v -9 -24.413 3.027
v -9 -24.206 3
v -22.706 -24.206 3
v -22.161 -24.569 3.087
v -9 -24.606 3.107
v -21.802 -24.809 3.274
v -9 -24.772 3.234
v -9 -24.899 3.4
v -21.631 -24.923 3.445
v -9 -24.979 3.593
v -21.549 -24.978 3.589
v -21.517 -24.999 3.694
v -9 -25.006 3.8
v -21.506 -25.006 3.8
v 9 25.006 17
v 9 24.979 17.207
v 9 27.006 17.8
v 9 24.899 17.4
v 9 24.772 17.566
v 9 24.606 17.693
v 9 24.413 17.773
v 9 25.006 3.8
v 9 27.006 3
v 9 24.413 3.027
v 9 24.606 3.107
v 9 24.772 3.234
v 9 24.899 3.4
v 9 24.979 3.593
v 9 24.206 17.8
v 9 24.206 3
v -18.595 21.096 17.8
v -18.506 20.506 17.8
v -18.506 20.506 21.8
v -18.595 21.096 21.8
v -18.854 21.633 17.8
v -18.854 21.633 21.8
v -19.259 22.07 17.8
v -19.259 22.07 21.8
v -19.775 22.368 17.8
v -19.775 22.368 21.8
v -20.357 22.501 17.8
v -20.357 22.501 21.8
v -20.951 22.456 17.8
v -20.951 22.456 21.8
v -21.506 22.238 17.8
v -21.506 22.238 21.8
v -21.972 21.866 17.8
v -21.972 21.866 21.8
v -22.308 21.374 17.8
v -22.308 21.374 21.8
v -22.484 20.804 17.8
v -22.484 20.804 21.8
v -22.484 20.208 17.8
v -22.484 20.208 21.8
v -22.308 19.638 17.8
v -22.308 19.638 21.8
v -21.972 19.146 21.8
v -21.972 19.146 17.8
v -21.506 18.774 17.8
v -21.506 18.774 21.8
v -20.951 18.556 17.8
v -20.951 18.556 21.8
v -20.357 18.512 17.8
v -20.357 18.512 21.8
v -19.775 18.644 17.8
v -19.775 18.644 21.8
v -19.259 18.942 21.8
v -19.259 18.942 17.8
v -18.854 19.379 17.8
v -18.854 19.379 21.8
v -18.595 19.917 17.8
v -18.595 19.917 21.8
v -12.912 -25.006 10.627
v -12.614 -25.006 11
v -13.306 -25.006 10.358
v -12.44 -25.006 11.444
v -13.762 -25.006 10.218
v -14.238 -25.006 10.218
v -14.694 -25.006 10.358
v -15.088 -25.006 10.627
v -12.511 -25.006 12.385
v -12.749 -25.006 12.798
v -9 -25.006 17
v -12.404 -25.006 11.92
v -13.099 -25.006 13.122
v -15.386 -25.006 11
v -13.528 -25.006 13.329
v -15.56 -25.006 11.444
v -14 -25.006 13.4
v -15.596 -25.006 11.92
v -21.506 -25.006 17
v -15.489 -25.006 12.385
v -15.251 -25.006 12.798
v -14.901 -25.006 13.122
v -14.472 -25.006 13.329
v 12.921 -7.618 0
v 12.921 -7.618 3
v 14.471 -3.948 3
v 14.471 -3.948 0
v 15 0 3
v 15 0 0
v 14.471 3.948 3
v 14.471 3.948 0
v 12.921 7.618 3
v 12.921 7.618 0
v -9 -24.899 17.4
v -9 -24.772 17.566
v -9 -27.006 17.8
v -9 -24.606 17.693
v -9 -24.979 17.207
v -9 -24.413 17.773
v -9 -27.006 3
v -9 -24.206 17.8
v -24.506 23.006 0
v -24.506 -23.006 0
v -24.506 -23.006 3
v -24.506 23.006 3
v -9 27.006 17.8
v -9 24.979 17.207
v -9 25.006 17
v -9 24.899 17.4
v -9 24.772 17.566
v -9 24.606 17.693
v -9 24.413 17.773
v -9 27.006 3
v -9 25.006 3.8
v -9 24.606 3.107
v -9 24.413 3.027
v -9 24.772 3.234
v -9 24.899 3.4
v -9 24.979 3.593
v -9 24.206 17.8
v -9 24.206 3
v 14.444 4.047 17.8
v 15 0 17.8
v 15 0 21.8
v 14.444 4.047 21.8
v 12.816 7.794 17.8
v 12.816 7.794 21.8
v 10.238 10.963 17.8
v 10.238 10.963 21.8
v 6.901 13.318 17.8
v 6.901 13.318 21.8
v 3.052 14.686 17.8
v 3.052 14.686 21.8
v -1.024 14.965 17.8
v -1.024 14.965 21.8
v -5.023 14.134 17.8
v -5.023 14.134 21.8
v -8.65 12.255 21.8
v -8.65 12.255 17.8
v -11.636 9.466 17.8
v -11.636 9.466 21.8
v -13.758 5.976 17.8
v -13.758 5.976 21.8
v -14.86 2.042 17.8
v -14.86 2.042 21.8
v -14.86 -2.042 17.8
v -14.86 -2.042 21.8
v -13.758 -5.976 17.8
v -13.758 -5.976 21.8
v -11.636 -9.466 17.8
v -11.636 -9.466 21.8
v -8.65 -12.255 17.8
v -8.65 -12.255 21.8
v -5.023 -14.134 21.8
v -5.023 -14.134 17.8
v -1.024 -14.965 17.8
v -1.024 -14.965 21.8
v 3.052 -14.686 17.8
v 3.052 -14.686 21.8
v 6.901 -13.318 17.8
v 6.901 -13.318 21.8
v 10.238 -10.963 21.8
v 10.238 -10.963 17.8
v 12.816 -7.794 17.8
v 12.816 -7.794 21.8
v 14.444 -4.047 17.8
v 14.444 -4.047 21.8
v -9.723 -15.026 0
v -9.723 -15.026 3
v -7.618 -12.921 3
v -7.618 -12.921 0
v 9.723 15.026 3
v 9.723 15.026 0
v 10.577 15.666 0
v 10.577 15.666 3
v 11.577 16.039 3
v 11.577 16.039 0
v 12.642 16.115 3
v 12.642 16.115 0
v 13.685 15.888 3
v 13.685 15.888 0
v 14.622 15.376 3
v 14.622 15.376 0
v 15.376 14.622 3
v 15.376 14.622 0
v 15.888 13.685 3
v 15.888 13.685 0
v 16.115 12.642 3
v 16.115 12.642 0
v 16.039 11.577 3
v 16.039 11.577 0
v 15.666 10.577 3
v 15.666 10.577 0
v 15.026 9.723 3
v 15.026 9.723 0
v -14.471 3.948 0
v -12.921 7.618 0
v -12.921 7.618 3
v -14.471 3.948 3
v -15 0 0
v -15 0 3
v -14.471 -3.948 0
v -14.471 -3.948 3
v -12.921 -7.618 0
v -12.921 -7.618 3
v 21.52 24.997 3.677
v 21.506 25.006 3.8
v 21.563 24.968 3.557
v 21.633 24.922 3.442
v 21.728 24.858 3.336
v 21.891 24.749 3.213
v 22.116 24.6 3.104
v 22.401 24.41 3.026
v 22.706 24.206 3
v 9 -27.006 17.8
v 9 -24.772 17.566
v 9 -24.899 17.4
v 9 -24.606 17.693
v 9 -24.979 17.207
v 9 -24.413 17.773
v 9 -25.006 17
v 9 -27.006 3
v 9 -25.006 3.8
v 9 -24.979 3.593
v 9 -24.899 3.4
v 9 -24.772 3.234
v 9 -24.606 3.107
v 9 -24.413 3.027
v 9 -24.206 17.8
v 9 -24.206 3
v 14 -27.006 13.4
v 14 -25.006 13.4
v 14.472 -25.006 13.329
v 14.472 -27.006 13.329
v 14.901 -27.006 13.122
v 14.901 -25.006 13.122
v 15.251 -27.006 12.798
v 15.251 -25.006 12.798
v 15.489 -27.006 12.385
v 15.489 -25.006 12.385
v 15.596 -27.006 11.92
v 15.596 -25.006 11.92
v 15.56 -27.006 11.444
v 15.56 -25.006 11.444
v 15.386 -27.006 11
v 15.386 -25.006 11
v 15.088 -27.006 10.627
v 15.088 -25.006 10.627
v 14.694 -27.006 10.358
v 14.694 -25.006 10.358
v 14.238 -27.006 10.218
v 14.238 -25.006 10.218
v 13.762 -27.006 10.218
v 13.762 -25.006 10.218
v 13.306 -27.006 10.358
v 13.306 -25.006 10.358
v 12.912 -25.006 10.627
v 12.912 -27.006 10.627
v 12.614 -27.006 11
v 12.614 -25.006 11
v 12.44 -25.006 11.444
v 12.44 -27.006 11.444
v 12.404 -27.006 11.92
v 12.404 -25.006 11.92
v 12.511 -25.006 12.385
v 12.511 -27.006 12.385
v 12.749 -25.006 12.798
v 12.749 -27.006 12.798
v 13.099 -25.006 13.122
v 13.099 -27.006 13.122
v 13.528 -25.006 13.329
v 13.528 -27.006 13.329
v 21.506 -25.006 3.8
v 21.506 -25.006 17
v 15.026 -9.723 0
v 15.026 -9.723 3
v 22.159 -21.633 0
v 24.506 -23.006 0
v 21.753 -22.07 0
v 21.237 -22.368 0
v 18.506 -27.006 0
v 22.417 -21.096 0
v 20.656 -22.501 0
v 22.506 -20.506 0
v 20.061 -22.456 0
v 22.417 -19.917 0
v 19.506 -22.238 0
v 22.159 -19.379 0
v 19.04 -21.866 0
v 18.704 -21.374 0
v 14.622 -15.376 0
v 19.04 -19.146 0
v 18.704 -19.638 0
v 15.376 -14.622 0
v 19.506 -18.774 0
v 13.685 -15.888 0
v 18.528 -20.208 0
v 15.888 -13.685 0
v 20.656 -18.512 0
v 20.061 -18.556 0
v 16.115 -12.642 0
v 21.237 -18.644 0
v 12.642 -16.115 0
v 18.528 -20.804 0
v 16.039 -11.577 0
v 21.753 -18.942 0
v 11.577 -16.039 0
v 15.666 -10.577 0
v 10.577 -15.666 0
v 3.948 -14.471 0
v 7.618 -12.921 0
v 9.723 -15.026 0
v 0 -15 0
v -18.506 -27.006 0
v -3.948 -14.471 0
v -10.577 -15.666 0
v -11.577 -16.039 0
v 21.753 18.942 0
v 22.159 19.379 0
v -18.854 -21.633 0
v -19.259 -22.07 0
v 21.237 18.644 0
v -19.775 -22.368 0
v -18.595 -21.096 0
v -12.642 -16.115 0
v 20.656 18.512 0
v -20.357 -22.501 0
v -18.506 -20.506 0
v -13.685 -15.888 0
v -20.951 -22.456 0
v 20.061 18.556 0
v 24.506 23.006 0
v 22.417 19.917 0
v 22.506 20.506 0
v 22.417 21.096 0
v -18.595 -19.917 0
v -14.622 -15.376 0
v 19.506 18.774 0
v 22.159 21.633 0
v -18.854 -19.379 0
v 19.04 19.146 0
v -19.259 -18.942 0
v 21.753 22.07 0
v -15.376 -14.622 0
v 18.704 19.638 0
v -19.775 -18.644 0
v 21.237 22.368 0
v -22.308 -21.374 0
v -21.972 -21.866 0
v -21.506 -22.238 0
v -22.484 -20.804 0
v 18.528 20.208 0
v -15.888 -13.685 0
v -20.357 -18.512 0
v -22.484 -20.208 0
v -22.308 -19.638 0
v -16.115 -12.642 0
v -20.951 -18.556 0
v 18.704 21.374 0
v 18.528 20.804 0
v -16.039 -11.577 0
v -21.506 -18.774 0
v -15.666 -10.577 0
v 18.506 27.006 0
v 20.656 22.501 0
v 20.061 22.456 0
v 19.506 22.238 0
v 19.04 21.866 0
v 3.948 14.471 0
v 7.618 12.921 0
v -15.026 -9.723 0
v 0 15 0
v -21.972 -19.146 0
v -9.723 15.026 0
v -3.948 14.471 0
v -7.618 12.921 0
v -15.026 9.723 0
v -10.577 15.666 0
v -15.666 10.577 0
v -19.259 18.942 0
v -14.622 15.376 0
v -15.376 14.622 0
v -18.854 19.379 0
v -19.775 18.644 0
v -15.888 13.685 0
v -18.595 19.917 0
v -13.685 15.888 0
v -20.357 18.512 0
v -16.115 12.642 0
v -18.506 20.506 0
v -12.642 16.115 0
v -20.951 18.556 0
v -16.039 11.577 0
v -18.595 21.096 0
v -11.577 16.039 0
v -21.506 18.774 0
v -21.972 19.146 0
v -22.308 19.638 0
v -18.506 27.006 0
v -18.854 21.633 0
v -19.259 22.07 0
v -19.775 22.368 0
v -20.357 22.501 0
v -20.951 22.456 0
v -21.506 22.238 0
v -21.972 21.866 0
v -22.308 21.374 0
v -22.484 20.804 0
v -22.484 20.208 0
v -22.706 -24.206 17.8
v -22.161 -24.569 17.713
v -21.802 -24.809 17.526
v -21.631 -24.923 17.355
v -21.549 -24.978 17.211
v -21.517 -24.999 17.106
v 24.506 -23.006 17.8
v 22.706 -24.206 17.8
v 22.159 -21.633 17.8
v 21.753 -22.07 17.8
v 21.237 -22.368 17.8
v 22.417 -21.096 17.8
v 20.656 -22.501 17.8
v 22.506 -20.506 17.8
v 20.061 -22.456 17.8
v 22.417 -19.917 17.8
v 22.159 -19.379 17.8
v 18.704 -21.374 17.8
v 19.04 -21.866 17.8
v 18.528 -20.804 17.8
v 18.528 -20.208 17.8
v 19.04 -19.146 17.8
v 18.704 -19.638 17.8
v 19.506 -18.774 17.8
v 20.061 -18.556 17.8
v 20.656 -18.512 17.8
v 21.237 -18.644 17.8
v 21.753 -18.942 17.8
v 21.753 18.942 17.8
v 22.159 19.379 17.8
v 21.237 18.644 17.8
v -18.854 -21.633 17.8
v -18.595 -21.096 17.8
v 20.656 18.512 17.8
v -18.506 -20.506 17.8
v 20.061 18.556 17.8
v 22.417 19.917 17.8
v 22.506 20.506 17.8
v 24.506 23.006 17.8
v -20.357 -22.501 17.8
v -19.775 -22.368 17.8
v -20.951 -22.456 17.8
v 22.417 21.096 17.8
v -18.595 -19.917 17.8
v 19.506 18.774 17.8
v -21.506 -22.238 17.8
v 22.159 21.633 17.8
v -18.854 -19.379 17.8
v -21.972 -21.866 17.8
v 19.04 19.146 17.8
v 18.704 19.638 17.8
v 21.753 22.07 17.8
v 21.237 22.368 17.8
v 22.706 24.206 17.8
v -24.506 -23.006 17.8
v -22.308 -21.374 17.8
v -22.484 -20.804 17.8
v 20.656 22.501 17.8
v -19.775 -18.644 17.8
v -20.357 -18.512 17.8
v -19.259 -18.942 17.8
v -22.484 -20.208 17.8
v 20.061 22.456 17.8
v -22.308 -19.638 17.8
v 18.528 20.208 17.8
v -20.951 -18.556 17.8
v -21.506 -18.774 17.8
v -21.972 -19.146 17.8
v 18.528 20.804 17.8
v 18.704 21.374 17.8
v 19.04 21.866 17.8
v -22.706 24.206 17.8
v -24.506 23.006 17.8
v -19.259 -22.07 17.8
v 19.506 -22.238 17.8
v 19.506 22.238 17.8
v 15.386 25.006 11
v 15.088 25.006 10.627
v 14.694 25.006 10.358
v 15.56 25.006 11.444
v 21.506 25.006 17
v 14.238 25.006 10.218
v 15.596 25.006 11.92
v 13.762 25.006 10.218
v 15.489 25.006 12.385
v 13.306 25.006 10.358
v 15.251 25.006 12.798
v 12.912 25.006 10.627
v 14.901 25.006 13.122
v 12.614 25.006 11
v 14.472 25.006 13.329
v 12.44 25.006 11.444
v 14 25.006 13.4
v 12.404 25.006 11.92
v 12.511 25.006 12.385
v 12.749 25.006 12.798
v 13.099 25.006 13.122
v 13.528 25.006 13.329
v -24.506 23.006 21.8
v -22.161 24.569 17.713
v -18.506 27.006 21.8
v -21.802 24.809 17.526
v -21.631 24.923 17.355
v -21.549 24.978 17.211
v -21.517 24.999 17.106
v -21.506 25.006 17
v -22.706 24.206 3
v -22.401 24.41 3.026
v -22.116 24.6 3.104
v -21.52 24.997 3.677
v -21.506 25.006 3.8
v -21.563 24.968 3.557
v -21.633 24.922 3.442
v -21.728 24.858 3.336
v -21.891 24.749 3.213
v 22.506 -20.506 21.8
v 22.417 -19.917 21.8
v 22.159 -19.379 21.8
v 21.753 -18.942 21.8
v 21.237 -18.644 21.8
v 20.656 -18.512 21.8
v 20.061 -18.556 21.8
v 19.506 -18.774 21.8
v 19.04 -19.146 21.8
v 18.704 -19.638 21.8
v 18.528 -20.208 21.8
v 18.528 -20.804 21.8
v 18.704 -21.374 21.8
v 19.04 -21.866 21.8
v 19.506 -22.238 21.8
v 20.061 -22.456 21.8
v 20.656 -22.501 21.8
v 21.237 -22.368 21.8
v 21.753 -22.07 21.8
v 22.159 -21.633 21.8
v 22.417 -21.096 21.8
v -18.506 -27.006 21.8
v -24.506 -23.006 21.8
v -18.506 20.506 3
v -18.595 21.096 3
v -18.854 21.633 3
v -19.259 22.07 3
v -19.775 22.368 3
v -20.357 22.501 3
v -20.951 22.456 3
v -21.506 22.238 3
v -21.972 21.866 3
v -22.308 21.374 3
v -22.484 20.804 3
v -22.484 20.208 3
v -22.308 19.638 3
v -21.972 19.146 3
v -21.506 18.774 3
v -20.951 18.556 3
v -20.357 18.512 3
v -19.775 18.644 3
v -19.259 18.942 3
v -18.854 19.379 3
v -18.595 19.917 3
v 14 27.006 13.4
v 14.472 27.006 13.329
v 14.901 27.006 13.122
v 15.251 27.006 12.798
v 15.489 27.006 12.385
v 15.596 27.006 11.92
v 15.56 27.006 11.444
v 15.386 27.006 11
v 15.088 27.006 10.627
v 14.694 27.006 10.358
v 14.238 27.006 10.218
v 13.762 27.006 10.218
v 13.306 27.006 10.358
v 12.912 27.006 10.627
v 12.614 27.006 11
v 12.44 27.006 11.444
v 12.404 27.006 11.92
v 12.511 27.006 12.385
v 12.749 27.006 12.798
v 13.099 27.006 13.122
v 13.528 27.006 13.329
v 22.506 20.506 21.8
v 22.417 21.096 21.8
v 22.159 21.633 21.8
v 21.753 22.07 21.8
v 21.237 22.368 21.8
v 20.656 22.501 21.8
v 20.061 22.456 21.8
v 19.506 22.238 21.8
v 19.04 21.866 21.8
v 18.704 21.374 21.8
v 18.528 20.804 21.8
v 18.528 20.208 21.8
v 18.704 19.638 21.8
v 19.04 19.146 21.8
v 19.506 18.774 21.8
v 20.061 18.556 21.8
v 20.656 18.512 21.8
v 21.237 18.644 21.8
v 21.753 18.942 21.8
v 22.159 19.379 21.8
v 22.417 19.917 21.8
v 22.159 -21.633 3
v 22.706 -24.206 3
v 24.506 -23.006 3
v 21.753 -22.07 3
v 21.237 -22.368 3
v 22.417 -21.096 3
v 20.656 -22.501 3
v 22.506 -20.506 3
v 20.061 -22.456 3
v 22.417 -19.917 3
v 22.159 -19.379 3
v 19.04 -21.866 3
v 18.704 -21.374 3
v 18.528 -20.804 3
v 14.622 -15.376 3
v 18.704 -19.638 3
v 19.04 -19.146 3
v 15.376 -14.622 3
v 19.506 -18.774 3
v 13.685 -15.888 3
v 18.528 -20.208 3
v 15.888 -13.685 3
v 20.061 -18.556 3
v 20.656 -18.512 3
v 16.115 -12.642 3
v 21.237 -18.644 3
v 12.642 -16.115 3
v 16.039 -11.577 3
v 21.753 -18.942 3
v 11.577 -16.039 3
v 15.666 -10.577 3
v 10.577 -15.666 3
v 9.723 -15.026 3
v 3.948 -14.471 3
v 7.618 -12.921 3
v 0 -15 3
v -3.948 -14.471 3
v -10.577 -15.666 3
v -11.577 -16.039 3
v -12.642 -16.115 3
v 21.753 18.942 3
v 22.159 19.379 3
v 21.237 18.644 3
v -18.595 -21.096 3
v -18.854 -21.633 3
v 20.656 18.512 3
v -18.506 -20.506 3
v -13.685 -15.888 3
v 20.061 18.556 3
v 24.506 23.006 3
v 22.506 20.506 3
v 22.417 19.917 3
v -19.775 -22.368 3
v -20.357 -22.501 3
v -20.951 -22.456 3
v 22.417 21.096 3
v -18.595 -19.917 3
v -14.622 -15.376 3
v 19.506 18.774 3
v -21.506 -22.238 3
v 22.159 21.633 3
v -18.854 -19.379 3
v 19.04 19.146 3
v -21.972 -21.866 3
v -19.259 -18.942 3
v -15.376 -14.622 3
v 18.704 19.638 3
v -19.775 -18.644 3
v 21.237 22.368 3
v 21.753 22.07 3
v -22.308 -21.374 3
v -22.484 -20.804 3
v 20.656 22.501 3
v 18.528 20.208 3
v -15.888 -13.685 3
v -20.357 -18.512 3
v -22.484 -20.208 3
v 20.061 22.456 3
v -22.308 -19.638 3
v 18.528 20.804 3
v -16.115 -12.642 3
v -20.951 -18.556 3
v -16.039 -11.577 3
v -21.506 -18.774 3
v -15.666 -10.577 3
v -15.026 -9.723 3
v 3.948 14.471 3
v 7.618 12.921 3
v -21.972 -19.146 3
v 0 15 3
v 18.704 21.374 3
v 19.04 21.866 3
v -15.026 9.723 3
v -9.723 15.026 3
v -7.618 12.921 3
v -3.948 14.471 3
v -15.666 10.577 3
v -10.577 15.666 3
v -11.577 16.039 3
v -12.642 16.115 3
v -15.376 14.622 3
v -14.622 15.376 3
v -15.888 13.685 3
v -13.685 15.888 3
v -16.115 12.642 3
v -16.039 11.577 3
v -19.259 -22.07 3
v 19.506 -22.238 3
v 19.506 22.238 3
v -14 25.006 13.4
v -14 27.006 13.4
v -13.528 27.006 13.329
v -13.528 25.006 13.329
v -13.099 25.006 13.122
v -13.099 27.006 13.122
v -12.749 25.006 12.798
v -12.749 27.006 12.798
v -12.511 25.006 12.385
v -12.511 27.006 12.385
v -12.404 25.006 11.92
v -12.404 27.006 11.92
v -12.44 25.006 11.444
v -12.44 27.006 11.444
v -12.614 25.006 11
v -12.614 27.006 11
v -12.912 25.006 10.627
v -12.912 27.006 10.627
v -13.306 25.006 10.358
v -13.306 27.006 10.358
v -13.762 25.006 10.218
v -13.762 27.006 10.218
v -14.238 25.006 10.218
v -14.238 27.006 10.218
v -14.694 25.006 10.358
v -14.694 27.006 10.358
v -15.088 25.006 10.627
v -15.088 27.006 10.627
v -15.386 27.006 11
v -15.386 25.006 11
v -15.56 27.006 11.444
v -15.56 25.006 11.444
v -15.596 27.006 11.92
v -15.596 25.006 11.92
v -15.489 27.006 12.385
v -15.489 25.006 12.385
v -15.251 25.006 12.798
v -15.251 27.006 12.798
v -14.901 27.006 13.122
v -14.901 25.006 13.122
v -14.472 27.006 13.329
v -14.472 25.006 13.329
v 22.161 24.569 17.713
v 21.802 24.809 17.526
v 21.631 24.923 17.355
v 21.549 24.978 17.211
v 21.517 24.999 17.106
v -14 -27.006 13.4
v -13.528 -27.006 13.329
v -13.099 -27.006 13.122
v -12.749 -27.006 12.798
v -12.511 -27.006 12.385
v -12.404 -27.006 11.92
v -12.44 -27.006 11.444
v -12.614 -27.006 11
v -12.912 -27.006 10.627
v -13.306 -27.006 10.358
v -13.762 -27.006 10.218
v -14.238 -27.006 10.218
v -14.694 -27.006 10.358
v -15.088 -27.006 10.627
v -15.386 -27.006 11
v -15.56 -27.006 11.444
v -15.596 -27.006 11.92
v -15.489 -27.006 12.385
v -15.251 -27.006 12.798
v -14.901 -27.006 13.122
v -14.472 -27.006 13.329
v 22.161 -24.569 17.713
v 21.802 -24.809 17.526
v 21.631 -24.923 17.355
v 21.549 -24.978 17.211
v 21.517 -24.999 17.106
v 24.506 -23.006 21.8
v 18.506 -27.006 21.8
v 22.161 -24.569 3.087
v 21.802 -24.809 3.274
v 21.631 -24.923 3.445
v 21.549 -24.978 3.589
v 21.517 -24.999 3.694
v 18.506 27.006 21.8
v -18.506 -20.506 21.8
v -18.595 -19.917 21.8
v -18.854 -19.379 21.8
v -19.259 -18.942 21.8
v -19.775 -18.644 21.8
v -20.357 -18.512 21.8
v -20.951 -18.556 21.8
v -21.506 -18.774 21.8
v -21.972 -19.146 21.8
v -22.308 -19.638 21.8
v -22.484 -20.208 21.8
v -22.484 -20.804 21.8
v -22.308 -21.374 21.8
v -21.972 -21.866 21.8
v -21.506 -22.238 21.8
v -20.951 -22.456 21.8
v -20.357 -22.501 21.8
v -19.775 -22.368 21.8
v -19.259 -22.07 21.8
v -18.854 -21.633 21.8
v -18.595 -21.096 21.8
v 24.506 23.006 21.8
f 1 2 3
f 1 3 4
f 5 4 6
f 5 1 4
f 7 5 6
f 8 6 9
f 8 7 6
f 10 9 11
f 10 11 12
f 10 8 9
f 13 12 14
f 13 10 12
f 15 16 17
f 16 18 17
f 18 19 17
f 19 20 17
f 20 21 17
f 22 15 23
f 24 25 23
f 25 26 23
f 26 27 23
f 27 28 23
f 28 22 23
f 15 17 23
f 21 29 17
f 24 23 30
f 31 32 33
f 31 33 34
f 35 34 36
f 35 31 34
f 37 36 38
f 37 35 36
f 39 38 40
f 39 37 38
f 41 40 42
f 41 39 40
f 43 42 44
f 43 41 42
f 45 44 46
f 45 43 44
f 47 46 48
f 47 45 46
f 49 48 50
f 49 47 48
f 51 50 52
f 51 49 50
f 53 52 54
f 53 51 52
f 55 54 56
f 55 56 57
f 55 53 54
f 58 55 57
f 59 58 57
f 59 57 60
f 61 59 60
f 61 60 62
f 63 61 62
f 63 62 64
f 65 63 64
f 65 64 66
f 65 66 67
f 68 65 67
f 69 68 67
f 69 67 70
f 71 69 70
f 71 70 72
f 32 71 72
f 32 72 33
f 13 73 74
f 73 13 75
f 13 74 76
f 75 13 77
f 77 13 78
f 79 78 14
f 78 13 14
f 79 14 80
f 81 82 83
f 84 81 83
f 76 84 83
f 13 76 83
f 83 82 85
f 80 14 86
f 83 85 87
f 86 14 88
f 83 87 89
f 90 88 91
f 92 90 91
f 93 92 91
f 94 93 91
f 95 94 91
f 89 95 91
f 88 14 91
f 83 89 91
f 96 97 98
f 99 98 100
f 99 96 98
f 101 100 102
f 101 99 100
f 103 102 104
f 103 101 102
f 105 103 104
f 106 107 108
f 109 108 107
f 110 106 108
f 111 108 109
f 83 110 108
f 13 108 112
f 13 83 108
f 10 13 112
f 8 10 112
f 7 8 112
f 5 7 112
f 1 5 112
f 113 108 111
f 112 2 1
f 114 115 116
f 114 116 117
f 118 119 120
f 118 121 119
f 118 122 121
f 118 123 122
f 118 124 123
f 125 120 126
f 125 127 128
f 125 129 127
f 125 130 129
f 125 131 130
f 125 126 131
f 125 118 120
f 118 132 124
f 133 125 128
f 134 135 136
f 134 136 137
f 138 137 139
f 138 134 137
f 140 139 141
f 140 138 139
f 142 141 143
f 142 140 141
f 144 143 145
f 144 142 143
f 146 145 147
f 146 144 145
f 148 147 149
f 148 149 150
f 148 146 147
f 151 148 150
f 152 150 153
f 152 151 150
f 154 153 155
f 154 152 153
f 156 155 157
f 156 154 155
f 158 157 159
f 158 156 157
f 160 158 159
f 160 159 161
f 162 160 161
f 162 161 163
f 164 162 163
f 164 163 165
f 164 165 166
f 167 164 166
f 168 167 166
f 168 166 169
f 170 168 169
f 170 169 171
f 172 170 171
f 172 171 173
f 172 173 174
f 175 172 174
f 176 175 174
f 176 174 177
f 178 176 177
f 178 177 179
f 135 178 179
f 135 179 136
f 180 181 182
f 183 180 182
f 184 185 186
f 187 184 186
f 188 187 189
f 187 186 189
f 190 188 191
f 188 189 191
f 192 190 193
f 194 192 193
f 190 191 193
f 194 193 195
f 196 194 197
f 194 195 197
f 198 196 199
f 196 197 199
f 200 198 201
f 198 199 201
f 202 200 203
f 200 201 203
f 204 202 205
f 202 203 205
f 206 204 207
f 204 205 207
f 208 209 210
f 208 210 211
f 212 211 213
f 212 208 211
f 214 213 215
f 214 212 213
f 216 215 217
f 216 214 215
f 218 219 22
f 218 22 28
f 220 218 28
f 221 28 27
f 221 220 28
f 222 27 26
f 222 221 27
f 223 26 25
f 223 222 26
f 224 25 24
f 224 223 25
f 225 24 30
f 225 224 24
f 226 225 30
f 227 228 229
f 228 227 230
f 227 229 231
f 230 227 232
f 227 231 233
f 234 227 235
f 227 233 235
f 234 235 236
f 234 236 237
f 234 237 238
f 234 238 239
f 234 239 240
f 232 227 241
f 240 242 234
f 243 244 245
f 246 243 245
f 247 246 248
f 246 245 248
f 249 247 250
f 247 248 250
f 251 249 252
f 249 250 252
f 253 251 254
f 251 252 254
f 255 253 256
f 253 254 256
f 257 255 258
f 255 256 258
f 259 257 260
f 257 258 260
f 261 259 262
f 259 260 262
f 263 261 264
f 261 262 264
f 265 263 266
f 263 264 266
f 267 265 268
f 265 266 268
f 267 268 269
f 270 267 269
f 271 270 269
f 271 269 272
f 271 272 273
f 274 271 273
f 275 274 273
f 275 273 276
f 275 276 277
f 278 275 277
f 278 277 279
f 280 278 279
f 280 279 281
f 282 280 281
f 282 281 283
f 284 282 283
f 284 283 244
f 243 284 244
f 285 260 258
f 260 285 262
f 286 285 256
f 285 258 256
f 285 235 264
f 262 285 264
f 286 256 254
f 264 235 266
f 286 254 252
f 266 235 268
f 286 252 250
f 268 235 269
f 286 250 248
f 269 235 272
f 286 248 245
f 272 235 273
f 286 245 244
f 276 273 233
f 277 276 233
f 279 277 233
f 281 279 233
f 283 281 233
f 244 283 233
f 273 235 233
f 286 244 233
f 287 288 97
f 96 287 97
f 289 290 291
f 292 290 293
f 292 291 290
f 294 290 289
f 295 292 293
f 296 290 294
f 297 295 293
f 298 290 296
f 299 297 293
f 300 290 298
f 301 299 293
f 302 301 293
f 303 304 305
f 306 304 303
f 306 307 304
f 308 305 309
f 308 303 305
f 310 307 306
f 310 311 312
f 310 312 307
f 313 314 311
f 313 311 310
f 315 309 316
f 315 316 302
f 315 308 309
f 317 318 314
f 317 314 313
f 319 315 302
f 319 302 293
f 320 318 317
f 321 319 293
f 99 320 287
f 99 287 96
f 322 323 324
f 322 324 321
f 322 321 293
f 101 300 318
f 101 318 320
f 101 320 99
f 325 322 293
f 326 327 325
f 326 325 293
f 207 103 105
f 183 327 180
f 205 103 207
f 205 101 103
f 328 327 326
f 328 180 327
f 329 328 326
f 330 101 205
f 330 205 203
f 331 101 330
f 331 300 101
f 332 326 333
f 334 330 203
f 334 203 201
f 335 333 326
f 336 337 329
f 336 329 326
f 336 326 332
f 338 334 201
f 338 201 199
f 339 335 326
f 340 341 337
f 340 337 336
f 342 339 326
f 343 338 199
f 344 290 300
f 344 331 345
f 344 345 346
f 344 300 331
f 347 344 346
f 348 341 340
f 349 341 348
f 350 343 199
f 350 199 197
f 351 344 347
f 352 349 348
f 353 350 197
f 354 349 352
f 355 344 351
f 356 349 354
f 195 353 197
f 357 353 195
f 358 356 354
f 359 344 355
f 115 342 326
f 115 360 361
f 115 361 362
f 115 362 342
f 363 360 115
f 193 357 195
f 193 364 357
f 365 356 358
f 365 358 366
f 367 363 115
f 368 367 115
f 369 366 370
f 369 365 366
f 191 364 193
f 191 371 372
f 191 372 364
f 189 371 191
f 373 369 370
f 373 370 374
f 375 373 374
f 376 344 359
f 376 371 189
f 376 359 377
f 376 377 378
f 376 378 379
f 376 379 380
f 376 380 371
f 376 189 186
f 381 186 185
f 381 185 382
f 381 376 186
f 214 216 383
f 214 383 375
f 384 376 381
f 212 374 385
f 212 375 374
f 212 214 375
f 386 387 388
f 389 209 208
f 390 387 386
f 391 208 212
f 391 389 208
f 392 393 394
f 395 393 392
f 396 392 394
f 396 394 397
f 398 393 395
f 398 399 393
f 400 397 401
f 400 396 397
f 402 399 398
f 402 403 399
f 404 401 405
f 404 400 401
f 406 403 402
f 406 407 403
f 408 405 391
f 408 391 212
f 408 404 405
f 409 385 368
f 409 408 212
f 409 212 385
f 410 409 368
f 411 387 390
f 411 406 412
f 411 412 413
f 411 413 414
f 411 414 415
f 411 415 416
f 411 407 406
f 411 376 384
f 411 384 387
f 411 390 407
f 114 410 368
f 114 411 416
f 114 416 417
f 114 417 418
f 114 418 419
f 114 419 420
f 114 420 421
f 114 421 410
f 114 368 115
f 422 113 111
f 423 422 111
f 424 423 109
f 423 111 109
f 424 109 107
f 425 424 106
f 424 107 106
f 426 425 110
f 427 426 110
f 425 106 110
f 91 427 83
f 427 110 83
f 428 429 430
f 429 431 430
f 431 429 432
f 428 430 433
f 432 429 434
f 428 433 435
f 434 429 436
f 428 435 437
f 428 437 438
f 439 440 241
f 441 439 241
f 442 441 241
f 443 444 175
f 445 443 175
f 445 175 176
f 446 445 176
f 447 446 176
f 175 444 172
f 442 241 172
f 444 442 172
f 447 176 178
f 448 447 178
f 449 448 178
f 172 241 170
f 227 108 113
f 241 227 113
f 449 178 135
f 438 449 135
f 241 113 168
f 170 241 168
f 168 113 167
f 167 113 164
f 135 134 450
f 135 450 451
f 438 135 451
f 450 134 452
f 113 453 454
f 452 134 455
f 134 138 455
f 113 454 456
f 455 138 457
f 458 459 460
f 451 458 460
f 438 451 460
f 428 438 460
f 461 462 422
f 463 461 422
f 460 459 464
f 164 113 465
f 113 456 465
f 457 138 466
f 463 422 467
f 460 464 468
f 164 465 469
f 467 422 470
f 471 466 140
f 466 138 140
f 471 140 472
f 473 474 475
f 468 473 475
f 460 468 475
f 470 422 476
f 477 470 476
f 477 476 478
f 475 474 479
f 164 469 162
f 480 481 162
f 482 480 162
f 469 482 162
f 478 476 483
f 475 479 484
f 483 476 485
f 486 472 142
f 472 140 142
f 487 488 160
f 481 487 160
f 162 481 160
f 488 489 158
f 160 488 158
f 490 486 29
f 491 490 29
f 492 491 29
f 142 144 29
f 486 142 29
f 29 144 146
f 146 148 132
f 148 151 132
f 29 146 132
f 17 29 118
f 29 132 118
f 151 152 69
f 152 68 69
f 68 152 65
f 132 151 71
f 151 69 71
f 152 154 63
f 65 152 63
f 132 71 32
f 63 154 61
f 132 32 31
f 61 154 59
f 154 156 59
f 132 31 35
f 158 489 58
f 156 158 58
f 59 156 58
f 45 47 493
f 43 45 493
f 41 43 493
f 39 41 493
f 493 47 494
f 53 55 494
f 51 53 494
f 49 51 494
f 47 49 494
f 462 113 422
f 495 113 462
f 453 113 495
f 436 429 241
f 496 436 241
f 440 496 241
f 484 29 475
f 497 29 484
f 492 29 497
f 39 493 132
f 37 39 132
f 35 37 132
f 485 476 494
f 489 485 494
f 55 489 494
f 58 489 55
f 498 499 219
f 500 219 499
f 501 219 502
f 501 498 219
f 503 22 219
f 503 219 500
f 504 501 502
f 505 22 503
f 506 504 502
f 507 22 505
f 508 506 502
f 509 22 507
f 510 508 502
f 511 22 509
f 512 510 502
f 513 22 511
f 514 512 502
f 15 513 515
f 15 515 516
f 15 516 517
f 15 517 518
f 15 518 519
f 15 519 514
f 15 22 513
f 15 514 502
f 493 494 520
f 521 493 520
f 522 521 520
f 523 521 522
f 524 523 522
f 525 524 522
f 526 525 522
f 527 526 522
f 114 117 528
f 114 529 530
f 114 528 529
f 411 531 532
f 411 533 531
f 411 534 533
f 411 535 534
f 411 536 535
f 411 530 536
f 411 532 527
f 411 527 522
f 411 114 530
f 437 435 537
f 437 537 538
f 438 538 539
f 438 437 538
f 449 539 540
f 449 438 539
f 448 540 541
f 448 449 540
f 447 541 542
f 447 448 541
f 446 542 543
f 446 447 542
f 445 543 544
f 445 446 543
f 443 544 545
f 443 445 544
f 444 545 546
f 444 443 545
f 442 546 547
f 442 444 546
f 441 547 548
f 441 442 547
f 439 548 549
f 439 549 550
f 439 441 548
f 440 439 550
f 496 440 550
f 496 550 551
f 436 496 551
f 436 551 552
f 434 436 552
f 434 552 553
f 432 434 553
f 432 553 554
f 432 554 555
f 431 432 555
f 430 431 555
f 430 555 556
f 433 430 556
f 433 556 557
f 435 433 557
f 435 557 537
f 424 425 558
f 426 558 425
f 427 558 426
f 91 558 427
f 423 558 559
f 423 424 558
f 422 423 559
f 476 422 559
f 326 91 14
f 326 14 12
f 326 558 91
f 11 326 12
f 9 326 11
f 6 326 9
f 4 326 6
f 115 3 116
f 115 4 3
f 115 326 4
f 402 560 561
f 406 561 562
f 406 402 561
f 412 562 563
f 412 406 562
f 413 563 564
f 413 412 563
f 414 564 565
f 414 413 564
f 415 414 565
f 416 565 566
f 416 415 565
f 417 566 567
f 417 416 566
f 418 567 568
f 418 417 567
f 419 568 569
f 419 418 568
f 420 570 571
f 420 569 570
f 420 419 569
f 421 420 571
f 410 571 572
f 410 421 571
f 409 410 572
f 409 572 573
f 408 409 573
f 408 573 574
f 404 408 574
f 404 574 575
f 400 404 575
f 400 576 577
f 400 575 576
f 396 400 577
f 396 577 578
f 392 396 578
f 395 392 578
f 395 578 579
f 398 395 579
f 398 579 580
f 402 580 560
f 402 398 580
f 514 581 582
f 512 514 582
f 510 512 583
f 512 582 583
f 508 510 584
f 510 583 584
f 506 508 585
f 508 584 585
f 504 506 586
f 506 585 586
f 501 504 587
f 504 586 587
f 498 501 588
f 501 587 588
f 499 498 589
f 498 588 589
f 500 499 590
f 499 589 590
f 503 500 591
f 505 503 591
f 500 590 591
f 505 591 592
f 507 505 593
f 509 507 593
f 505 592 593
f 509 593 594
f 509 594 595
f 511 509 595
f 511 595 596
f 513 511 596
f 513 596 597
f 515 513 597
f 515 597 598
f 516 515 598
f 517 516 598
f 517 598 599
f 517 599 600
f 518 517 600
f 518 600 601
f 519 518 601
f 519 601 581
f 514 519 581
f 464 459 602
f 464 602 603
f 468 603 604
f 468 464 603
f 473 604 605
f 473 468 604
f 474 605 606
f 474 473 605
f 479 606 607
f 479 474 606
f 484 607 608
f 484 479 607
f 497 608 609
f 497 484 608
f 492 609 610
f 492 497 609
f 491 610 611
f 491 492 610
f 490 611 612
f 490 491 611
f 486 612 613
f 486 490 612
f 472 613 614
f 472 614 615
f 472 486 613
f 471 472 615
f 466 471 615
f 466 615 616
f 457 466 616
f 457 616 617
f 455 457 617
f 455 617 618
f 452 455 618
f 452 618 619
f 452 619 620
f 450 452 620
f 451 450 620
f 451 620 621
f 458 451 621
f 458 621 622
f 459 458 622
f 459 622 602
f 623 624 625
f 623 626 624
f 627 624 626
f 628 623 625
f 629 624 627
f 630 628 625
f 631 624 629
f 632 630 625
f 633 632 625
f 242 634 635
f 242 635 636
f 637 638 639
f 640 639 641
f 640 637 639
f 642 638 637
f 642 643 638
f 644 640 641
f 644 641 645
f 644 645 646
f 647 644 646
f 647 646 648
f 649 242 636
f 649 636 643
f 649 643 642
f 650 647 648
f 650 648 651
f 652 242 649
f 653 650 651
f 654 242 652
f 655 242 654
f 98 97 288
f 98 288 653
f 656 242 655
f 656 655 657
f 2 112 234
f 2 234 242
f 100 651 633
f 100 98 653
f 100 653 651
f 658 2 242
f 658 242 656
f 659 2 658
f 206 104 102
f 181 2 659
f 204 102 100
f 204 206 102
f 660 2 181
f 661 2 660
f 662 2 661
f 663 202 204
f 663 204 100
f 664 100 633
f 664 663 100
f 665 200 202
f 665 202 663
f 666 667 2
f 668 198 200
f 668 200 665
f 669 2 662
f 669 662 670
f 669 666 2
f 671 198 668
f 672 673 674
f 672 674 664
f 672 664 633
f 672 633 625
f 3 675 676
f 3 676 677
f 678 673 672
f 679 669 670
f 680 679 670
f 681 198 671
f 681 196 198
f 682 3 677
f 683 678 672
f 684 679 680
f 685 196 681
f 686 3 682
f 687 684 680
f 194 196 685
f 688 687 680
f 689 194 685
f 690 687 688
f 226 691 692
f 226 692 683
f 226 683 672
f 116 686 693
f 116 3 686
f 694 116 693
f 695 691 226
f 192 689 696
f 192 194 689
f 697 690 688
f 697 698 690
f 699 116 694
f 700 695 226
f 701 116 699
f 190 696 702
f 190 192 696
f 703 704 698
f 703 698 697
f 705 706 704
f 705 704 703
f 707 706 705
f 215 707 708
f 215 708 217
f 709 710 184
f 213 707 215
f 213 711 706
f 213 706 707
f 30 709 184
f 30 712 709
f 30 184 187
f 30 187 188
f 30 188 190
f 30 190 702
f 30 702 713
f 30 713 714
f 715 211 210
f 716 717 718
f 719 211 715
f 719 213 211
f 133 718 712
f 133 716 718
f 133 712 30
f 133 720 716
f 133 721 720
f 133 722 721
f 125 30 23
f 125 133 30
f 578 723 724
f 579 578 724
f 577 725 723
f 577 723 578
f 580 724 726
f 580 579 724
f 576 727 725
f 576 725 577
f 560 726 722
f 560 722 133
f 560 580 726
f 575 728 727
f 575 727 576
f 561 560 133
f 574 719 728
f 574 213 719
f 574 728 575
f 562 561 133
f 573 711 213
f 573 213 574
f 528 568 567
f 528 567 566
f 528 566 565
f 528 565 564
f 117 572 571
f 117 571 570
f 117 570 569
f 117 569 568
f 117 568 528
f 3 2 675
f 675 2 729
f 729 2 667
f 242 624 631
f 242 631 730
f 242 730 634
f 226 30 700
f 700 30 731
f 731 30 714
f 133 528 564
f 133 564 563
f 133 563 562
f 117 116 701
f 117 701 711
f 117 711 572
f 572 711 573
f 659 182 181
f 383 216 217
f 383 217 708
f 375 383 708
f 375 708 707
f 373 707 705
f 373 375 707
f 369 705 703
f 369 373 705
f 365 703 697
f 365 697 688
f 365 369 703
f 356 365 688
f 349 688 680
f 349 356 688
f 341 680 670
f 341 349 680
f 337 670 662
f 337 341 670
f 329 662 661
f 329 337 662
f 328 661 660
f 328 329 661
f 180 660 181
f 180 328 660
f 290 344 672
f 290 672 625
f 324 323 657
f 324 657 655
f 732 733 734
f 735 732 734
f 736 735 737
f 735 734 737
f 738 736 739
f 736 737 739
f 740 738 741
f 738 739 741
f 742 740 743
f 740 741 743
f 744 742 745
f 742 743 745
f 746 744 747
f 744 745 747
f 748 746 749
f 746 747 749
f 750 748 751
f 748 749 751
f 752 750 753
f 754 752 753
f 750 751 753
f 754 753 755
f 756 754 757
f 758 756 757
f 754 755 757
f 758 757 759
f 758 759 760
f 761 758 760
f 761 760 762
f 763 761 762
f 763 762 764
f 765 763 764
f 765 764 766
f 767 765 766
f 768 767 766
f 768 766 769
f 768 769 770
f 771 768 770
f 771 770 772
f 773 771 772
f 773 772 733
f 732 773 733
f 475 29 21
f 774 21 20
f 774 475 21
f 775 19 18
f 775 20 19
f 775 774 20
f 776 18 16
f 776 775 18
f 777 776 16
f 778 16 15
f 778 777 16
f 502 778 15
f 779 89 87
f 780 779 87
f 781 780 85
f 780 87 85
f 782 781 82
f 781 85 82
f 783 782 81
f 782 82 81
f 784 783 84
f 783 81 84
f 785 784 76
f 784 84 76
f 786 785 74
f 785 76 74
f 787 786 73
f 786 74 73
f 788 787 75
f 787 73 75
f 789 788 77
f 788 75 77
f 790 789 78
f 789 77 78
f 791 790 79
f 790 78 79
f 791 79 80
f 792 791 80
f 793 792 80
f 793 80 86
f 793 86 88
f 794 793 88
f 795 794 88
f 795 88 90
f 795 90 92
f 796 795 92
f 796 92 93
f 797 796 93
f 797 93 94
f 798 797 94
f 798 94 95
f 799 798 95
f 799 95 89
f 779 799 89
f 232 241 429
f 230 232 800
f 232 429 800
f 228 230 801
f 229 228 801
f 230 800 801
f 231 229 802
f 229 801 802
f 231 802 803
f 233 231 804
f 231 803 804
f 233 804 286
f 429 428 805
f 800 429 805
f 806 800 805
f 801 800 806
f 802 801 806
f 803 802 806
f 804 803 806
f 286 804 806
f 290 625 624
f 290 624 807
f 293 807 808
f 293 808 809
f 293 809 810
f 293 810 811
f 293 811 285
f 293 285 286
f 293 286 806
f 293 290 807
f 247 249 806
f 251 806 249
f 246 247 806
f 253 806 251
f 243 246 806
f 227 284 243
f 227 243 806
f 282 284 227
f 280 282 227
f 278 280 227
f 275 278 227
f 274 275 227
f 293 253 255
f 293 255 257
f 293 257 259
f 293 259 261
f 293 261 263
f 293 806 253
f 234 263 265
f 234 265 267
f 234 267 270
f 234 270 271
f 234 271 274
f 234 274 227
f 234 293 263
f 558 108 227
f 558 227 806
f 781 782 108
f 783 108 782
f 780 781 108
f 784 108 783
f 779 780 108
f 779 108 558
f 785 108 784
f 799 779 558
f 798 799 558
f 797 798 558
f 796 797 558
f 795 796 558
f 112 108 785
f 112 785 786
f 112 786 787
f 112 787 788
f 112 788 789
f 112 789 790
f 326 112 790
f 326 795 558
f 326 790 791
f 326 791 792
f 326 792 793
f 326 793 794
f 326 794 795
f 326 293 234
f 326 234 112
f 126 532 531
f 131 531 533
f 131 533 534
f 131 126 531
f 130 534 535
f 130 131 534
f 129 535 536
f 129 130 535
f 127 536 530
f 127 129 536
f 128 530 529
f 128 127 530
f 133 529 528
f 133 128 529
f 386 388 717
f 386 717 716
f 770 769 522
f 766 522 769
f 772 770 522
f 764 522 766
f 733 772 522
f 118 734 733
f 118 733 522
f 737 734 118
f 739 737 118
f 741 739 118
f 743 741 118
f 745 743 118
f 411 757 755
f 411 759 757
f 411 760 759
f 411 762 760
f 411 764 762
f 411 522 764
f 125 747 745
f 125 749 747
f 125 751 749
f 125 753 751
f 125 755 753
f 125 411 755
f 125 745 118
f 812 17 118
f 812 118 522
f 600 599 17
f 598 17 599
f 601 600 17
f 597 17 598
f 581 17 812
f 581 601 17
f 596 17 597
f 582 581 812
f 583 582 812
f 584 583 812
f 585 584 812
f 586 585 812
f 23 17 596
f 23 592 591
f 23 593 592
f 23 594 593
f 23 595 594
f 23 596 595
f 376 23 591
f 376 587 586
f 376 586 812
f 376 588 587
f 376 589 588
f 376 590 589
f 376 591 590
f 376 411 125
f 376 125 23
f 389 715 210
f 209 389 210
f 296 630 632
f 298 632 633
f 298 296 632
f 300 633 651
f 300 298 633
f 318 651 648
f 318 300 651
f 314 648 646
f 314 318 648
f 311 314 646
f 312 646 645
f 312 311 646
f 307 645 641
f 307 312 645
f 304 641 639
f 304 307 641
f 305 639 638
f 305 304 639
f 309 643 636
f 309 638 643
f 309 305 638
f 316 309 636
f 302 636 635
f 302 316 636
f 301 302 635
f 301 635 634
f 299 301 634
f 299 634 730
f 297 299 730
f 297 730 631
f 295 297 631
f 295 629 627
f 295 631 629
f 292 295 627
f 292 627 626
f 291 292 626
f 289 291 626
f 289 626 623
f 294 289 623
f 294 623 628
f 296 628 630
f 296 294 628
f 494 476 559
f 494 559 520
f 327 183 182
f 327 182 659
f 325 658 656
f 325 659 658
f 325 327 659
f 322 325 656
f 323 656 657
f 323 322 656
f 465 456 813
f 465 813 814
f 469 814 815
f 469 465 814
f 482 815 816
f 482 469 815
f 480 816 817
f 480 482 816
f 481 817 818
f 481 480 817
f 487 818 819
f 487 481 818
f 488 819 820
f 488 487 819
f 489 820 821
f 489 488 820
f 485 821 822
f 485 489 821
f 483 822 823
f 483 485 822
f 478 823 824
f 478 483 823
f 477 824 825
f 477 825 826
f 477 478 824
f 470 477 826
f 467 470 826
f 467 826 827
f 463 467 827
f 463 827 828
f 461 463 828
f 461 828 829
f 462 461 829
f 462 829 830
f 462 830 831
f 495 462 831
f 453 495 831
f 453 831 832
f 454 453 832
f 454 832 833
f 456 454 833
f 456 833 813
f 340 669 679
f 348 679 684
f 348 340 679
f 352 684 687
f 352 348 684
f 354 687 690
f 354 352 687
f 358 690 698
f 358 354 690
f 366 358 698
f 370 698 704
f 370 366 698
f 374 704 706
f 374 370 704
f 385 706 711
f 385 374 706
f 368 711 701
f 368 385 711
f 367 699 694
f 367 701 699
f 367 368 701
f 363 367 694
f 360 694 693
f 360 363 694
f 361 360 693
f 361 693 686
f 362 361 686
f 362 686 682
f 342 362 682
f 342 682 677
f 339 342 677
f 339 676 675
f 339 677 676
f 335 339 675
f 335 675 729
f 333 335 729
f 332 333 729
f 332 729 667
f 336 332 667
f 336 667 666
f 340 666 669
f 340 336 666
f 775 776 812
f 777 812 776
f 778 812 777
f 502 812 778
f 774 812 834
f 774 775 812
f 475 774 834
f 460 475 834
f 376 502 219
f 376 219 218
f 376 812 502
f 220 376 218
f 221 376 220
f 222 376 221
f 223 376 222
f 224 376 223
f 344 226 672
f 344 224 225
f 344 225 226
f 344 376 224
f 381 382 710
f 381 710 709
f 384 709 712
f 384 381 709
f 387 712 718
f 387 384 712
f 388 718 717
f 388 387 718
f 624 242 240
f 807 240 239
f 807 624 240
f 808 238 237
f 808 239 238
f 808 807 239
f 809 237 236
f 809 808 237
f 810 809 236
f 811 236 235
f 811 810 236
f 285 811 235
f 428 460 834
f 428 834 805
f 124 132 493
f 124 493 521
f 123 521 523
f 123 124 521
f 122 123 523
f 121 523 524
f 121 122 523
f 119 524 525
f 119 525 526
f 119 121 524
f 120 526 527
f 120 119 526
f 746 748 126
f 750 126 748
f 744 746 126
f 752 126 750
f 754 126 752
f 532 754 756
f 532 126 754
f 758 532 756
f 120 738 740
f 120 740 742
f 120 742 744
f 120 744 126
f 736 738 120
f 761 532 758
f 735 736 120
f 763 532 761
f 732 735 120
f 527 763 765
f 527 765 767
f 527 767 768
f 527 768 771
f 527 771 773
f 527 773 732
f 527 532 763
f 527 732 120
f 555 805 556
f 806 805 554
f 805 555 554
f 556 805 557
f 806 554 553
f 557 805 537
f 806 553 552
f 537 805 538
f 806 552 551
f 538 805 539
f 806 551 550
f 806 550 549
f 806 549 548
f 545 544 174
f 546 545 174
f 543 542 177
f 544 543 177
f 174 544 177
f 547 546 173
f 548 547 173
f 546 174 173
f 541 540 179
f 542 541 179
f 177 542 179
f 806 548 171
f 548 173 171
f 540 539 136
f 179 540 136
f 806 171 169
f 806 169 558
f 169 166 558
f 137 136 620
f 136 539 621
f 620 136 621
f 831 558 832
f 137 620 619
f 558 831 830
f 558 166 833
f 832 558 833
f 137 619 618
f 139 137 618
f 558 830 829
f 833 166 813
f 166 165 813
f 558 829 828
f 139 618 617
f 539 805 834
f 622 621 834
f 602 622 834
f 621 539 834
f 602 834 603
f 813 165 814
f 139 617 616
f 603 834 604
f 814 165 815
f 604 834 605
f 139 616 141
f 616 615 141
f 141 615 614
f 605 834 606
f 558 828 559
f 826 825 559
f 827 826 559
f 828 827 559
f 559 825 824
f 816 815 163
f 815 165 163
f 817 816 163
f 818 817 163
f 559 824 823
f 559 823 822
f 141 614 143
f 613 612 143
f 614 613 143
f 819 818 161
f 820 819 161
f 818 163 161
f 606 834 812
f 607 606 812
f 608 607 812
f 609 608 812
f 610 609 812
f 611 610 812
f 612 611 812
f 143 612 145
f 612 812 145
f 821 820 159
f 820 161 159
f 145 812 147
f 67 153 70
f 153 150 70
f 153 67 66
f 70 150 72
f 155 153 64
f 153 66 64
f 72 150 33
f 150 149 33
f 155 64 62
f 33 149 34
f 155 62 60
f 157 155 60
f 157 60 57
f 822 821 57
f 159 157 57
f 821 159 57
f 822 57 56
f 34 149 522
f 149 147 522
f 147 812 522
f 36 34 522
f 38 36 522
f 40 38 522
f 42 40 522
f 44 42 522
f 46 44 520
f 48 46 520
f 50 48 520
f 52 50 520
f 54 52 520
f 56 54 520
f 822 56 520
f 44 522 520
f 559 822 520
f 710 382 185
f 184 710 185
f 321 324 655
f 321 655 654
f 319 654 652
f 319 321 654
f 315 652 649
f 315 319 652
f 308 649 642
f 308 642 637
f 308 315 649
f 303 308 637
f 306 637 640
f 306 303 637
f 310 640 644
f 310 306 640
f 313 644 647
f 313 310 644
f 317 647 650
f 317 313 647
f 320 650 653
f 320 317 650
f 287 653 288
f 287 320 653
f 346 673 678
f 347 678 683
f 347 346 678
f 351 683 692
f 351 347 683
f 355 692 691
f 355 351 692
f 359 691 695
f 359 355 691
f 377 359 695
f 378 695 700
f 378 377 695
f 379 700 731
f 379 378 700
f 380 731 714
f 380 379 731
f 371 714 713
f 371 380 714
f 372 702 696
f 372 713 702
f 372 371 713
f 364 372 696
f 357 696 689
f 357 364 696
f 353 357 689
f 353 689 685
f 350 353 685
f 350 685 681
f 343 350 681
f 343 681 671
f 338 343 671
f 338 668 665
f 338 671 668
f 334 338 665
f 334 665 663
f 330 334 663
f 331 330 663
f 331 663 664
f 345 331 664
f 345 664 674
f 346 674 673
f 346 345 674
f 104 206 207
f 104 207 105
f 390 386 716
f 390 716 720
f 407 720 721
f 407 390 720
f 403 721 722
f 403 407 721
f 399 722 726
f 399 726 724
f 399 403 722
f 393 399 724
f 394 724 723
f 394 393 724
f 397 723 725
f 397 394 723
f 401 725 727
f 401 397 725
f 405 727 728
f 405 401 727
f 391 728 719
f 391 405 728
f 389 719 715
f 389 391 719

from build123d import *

# Parameters (mm, degrees)
SKETCH_1_R          = 15
SKETCH_1_R_2        = 2
EXTRUDE_1_DEPTH     = 21.8
SKETCH_2_W          = 14.8
SKETCH_2_H          = 50.012193308
CUT_EXTRUDE_1_DEPTH = 61.056343124
FILLET_1_R          = 0.8
SKETCH_3_R          = 1.6
CUT_EXTRUDE_2_DEPTH = 64.191026256
SKETCH_4_W          = 18
SKETCH_4_H          = 14.8
CUT_EXTRUDE_3_DEPTH = 64.191026256
CUT_EXTRUDE_4_DEPTH = 3


with BuildPart() as part:
    # 草图1 → 凸台-拉伸1 (new body)
    with BuildSketch(Plane.XY):
        Polygon((-24.506096654, 23.006096654), (-18.506096654, 27.006096654), (18.506096654, 27.006096654), (24.506096654, 23.006096654), (24.506096654, -23.006096654), (18.506096654, -27.006096654), (-18.506096654, -27.006096654), (-24.506096654, -23.006096654), align=None)
        Circle(SKETCH_1_R, mode=Mode.SUBTRACT)
        with Locations((-20.506096654, 20.506096654)):
            Circle(SKETCH_1_R_2, mode=Mode.SUBTRACT)
        with Locations((20.506096654, 20.506096654)):
            Circle(SKETCH_1_R_2, mode=Mode.SUBTRACT)
        with Locations((20.506096654, -20.506096654)):
            Circle(SKETCH_1_R_2, mode=Mode.SUBTRACT)
        with Locations((-20.506096654, -20.506096654)):
            Circle(SKETCH_1_R_2, mode=Mode.SUBTRACT)
    extrude(amount=EXTRUDE_1_DEPTH)

    # 草图2 → 切除-拉伸1 (cut, through all)
    with BuildSketch(Plane.ZY.offset(24.506096654)):
        with Locations((10.4, 0)):
            Rectangle(SKETCH_2_W, SKETCH_2_H)
    extrude(amount=-CUT_EXTRUDE_1_DEPTH, mode=Mode.SUBTRACT)

    # 圆角1
    fillet_1_edges = [part.edges().sort_by_distance(p)[0] for p in [
        (0, -25.006096654, 17.8),
        (0, 25.006096654, 3),
        (0, -25.006096654, 3),
        (0, 25.006096654, 17.8),
    ]]
    fillet(fillet_1_edges, radius=FILLET_1_R)

    # 草图3 → 切除-拉伸2 (cut, through all)
    with BuildSketch(Plane(origin=(0, 27.006096654, 0), x_dir=(1, 0, 0), z_dir=(0, 1, 0))):
        with Locations(Location((-14, -11.8, 0), (0, 0, 270))):
            Circle(SKETCH_3_R)
        with Locations(Location((14, -11.8, 0), (0, 0, 270))):
            Circle(SKETCH_3_R)
    extrude(amount=-CUT_EXTRUDE_2_DEPTH, mode=Mode.SUBTRACT)

    # 草图4 → 切除-拉伸3 (cut, through all)
    with BuildSketch(Plane(origin=(0, 27.006096654, 0), x_dir=(1, 0, 0), z_dir=(0, 1, 0))):
        with Locations((0, -10.4)):
            Rectangle(SKETCH_4_W, SKETCH_4_H)
    extrude(amount=-CUT_EXTRUDE_3_DEPTH, mode=Mode.SUBTRACT)

    # 草图5 → 切除-拉伸4 (cut)
    with BuildSketch(Plane(origin=(0, 0, 0), x_dir=(-1, 0, 0), z_dir=(0, 0, -1))):
        with BuildLine():
            Line((-15.0260191, 9.722718241), (-12.921448383, 7.618147524))
            ThreePointArc((-12.921448383, 7.618147524), (-10.606601718, 10.606601718), (-7.618147524, 12.921448383))
            Line((-7.618147524, 12.921448383), (-9.722718241, 15.0260191))
            ThreePointArc((-9.722718241, 15.0260191), (-15.0260191, 15.0260191), (-15.0260191, 9.722718241))
        make_face()
        with BuildLine():
            Line((15.0260191, 9.722718241), (12.921448383, 7.618147524))
            ThreePointArc((12.921448383, 7.618147524), (10.606601718, 10.606601718), (7.618147524, 12.921448383))
            Line((7.618147524, 12.921448383), (9.722718241, 15.0260191))
            ThreePointArc((9.722718241, 15.0260191), (15.0260191, 15.0260191), (15.0260191, 9.722718241))
        make_face()
        with BuildLine():
            Line((9.722718241, -15.0260191), (7.618147524, -12.921448383))
            ThreePointArc((7.618147524, -12.921448383), (10.606601718, -10.606601718), (12.921448383, -7.618147524))
            Line((12.921448383, -7.618147524), (15.0260191, -9.722718241))
            ThreePointArc((15.0260191, -9.722718241), (15.0260191, -15.0260191), (9.722718241, -15.0260191))
        make_face()
        with BuildLine():
            Line((-15.0260191, -9.722718241), (-12.921448383, -7.618147524))
            ThreePointArc((-12.921448383, -7.618147524), (-10.606601718, -10.606601718), (-7.618147524, -12.921448383))
            Line((-7.618147524, -12.921448383), (-9.722718241, -15.0260191))
            ThreePointArc((-9.722718241, -15.0260191), (-15.0260191, -15.0260191), (-15.0260191, -9.722718241))
        make_face()
    extrude(amount=-CUT_EXTRUDE_4_DEPTH, mode=Mode.SUBTRACT)


solid = part.part
